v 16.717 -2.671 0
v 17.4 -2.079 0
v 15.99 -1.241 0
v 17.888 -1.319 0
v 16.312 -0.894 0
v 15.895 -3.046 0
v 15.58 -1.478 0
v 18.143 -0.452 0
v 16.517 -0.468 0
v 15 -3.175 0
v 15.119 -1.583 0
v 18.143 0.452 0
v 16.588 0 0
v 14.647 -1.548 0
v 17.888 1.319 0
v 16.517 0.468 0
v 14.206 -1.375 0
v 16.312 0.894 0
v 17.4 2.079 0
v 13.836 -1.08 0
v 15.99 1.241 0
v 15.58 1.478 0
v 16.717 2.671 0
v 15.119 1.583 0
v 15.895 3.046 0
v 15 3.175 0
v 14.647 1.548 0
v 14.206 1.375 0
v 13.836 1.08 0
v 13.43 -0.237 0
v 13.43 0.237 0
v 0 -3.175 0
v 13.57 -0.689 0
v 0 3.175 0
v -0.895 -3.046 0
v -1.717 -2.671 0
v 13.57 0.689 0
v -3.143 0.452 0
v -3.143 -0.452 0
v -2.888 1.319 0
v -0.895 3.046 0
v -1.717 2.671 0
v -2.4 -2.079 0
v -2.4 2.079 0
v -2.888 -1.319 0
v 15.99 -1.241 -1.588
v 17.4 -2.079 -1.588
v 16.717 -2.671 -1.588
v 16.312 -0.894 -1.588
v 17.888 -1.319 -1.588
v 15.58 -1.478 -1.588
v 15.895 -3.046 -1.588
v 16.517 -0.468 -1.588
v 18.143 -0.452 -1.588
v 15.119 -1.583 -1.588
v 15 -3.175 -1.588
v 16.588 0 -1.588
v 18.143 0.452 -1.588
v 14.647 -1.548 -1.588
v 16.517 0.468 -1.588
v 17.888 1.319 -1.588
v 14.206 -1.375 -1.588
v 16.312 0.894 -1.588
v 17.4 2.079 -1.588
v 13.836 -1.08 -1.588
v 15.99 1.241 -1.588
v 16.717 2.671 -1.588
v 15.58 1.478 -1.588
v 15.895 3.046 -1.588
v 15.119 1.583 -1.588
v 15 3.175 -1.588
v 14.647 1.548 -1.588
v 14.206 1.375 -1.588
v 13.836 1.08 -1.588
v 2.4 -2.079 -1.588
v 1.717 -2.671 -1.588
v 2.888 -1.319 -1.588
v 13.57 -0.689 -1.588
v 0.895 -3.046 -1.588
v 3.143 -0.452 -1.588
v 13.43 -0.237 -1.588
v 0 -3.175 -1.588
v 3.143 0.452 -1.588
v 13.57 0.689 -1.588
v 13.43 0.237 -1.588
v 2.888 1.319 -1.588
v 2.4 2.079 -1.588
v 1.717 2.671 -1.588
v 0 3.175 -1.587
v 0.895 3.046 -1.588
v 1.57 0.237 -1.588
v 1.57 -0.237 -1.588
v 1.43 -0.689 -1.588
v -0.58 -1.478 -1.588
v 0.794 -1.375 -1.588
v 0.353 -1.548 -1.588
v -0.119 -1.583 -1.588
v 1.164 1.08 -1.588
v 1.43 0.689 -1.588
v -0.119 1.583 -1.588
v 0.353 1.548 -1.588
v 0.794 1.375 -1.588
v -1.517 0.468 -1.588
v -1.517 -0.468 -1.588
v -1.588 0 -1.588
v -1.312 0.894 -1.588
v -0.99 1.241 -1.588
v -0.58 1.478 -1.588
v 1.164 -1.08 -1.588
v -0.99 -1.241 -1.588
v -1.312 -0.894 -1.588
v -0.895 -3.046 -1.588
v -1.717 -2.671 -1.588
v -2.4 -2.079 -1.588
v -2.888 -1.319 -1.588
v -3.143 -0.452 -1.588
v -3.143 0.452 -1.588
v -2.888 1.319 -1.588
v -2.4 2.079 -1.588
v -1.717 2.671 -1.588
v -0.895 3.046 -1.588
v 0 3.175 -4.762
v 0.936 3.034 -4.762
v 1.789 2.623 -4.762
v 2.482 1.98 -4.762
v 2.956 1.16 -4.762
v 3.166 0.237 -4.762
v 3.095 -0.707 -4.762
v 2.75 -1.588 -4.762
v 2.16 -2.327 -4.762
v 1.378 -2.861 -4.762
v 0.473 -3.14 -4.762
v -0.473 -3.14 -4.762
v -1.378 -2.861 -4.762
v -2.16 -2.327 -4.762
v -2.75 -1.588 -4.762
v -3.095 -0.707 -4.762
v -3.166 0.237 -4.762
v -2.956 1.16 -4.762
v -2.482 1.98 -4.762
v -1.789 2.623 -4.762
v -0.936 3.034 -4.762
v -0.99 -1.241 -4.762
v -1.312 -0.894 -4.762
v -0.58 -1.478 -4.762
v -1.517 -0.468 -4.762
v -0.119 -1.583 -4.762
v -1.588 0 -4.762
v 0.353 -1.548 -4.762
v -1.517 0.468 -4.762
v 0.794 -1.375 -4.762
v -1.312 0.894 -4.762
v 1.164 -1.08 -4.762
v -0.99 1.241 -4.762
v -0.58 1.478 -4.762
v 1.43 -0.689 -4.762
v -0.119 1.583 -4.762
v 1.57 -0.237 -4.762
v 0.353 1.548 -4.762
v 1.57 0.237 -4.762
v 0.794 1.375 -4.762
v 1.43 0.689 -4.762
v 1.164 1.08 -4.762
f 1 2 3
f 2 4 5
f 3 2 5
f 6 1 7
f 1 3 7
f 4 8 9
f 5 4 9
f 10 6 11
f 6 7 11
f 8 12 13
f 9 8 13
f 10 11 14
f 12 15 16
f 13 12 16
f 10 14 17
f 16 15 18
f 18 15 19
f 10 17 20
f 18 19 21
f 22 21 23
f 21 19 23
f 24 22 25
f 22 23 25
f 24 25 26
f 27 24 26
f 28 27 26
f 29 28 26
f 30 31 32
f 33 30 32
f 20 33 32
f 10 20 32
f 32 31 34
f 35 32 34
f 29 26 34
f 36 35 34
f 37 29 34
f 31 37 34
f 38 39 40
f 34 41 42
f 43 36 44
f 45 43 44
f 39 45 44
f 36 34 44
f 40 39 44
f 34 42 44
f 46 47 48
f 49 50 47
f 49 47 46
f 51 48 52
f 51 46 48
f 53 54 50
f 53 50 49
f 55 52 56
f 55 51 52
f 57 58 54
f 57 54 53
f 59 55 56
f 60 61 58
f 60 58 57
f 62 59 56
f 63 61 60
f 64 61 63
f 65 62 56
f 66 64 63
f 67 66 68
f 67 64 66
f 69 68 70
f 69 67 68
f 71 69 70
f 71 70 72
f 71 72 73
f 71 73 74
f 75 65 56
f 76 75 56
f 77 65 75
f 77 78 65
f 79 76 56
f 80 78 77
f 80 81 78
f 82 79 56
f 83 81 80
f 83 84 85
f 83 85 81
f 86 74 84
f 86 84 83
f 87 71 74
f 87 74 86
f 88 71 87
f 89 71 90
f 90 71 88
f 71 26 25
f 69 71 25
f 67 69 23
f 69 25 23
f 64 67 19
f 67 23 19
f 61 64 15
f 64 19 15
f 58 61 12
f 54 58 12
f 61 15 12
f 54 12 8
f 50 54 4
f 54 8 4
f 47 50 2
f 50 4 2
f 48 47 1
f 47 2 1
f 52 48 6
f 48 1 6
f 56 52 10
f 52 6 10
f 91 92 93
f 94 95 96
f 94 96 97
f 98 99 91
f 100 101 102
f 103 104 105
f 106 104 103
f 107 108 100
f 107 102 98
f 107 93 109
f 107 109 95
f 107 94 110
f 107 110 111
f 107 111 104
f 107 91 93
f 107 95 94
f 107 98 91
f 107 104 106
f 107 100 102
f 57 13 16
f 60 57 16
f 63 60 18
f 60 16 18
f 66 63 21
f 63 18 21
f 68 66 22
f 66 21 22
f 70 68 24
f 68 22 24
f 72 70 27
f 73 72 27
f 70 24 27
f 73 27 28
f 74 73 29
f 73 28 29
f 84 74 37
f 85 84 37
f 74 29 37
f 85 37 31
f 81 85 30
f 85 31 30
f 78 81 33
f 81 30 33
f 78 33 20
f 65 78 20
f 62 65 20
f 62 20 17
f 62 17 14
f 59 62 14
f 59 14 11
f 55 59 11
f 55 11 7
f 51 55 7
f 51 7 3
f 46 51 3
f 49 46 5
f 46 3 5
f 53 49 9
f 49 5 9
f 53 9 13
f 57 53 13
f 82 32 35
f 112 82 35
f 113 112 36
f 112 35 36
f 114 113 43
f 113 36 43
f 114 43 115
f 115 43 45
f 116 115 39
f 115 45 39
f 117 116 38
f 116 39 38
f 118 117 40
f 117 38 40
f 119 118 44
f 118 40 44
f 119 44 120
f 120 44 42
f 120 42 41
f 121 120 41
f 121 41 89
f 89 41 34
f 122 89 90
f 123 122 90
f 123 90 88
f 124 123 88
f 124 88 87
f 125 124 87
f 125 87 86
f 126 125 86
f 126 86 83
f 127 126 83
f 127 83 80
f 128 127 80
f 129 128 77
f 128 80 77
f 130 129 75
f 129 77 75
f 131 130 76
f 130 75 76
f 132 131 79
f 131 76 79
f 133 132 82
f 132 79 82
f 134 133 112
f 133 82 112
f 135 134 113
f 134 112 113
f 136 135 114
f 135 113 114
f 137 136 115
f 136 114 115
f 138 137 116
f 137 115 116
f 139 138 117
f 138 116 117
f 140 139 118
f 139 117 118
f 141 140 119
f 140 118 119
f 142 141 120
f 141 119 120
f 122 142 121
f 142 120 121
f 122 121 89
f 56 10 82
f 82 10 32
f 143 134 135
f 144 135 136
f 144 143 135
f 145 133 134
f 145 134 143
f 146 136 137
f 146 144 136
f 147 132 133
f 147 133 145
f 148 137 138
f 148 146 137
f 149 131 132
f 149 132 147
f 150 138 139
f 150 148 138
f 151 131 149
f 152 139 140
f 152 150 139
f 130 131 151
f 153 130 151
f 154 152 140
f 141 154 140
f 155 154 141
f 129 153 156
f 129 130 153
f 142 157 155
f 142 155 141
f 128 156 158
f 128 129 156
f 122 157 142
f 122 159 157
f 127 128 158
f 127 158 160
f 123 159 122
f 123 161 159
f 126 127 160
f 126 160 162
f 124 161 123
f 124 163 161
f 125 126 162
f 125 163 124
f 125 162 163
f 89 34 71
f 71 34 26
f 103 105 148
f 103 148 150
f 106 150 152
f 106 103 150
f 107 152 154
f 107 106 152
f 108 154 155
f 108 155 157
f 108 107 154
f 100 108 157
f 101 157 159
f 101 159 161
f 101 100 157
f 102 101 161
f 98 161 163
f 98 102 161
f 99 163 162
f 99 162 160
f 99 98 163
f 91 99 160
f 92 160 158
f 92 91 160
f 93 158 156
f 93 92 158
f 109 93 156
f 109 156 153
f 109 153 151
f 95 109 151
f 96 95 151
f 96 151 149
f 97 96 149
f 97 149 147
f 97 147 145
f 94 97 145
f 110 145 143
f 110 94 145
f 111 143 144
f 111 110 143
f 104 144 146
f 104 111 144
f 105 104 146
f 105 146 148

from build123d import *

# Parameters (mm, degrees)
SKETCH1_R           = 1.5875
BOSS_EXTRUDE1_DEPTH = 1.5875
SKETCH2_R           = 3.175
SKETCH2_R_2         = 1.5875
BOSS_EXTRUDE2_DEPTH = 3.175


with BuildPart() as part:
    # Sketch1 → Boss-Extrude1 (new body)
    with BuildSketch(Plane.XY):
        with BuildLine():
            Line((0, 3.175), (15, 3.175))
            ThreePointArc((15, 3.175), (18.175, 0), (15, -3.175))
            Line((15, -3.175), (0, -3.175))
            ThreePointArc((0, -3.175), (-3.175, 0), (0, 3.175))
        make_face()
        with Locations((15, 0)):
            Circle(SKETCH1_R, mode=Mode.SUBTRACT)
    extrude(amount=-BOSS_EXTRUDE1_DEPTH)

    # Sketch2 → Boss-Extrude2 (add)
    with BuildSketch(Plane(origin=(0, 0, -1.5875), x_dir=(-1, 0, 0), z_dir=(0, 0, -1))):
        with Locations(Location((0, 0, 0), (0, 0, 90))):
            Circle(SKETCH2_R)
        Circle(SKETCH2_R_2, mode=Mode.SUBTRACT)
    extrude(amount=BOSS_EXTRUDE2_DEPTH)


solid = part.part
